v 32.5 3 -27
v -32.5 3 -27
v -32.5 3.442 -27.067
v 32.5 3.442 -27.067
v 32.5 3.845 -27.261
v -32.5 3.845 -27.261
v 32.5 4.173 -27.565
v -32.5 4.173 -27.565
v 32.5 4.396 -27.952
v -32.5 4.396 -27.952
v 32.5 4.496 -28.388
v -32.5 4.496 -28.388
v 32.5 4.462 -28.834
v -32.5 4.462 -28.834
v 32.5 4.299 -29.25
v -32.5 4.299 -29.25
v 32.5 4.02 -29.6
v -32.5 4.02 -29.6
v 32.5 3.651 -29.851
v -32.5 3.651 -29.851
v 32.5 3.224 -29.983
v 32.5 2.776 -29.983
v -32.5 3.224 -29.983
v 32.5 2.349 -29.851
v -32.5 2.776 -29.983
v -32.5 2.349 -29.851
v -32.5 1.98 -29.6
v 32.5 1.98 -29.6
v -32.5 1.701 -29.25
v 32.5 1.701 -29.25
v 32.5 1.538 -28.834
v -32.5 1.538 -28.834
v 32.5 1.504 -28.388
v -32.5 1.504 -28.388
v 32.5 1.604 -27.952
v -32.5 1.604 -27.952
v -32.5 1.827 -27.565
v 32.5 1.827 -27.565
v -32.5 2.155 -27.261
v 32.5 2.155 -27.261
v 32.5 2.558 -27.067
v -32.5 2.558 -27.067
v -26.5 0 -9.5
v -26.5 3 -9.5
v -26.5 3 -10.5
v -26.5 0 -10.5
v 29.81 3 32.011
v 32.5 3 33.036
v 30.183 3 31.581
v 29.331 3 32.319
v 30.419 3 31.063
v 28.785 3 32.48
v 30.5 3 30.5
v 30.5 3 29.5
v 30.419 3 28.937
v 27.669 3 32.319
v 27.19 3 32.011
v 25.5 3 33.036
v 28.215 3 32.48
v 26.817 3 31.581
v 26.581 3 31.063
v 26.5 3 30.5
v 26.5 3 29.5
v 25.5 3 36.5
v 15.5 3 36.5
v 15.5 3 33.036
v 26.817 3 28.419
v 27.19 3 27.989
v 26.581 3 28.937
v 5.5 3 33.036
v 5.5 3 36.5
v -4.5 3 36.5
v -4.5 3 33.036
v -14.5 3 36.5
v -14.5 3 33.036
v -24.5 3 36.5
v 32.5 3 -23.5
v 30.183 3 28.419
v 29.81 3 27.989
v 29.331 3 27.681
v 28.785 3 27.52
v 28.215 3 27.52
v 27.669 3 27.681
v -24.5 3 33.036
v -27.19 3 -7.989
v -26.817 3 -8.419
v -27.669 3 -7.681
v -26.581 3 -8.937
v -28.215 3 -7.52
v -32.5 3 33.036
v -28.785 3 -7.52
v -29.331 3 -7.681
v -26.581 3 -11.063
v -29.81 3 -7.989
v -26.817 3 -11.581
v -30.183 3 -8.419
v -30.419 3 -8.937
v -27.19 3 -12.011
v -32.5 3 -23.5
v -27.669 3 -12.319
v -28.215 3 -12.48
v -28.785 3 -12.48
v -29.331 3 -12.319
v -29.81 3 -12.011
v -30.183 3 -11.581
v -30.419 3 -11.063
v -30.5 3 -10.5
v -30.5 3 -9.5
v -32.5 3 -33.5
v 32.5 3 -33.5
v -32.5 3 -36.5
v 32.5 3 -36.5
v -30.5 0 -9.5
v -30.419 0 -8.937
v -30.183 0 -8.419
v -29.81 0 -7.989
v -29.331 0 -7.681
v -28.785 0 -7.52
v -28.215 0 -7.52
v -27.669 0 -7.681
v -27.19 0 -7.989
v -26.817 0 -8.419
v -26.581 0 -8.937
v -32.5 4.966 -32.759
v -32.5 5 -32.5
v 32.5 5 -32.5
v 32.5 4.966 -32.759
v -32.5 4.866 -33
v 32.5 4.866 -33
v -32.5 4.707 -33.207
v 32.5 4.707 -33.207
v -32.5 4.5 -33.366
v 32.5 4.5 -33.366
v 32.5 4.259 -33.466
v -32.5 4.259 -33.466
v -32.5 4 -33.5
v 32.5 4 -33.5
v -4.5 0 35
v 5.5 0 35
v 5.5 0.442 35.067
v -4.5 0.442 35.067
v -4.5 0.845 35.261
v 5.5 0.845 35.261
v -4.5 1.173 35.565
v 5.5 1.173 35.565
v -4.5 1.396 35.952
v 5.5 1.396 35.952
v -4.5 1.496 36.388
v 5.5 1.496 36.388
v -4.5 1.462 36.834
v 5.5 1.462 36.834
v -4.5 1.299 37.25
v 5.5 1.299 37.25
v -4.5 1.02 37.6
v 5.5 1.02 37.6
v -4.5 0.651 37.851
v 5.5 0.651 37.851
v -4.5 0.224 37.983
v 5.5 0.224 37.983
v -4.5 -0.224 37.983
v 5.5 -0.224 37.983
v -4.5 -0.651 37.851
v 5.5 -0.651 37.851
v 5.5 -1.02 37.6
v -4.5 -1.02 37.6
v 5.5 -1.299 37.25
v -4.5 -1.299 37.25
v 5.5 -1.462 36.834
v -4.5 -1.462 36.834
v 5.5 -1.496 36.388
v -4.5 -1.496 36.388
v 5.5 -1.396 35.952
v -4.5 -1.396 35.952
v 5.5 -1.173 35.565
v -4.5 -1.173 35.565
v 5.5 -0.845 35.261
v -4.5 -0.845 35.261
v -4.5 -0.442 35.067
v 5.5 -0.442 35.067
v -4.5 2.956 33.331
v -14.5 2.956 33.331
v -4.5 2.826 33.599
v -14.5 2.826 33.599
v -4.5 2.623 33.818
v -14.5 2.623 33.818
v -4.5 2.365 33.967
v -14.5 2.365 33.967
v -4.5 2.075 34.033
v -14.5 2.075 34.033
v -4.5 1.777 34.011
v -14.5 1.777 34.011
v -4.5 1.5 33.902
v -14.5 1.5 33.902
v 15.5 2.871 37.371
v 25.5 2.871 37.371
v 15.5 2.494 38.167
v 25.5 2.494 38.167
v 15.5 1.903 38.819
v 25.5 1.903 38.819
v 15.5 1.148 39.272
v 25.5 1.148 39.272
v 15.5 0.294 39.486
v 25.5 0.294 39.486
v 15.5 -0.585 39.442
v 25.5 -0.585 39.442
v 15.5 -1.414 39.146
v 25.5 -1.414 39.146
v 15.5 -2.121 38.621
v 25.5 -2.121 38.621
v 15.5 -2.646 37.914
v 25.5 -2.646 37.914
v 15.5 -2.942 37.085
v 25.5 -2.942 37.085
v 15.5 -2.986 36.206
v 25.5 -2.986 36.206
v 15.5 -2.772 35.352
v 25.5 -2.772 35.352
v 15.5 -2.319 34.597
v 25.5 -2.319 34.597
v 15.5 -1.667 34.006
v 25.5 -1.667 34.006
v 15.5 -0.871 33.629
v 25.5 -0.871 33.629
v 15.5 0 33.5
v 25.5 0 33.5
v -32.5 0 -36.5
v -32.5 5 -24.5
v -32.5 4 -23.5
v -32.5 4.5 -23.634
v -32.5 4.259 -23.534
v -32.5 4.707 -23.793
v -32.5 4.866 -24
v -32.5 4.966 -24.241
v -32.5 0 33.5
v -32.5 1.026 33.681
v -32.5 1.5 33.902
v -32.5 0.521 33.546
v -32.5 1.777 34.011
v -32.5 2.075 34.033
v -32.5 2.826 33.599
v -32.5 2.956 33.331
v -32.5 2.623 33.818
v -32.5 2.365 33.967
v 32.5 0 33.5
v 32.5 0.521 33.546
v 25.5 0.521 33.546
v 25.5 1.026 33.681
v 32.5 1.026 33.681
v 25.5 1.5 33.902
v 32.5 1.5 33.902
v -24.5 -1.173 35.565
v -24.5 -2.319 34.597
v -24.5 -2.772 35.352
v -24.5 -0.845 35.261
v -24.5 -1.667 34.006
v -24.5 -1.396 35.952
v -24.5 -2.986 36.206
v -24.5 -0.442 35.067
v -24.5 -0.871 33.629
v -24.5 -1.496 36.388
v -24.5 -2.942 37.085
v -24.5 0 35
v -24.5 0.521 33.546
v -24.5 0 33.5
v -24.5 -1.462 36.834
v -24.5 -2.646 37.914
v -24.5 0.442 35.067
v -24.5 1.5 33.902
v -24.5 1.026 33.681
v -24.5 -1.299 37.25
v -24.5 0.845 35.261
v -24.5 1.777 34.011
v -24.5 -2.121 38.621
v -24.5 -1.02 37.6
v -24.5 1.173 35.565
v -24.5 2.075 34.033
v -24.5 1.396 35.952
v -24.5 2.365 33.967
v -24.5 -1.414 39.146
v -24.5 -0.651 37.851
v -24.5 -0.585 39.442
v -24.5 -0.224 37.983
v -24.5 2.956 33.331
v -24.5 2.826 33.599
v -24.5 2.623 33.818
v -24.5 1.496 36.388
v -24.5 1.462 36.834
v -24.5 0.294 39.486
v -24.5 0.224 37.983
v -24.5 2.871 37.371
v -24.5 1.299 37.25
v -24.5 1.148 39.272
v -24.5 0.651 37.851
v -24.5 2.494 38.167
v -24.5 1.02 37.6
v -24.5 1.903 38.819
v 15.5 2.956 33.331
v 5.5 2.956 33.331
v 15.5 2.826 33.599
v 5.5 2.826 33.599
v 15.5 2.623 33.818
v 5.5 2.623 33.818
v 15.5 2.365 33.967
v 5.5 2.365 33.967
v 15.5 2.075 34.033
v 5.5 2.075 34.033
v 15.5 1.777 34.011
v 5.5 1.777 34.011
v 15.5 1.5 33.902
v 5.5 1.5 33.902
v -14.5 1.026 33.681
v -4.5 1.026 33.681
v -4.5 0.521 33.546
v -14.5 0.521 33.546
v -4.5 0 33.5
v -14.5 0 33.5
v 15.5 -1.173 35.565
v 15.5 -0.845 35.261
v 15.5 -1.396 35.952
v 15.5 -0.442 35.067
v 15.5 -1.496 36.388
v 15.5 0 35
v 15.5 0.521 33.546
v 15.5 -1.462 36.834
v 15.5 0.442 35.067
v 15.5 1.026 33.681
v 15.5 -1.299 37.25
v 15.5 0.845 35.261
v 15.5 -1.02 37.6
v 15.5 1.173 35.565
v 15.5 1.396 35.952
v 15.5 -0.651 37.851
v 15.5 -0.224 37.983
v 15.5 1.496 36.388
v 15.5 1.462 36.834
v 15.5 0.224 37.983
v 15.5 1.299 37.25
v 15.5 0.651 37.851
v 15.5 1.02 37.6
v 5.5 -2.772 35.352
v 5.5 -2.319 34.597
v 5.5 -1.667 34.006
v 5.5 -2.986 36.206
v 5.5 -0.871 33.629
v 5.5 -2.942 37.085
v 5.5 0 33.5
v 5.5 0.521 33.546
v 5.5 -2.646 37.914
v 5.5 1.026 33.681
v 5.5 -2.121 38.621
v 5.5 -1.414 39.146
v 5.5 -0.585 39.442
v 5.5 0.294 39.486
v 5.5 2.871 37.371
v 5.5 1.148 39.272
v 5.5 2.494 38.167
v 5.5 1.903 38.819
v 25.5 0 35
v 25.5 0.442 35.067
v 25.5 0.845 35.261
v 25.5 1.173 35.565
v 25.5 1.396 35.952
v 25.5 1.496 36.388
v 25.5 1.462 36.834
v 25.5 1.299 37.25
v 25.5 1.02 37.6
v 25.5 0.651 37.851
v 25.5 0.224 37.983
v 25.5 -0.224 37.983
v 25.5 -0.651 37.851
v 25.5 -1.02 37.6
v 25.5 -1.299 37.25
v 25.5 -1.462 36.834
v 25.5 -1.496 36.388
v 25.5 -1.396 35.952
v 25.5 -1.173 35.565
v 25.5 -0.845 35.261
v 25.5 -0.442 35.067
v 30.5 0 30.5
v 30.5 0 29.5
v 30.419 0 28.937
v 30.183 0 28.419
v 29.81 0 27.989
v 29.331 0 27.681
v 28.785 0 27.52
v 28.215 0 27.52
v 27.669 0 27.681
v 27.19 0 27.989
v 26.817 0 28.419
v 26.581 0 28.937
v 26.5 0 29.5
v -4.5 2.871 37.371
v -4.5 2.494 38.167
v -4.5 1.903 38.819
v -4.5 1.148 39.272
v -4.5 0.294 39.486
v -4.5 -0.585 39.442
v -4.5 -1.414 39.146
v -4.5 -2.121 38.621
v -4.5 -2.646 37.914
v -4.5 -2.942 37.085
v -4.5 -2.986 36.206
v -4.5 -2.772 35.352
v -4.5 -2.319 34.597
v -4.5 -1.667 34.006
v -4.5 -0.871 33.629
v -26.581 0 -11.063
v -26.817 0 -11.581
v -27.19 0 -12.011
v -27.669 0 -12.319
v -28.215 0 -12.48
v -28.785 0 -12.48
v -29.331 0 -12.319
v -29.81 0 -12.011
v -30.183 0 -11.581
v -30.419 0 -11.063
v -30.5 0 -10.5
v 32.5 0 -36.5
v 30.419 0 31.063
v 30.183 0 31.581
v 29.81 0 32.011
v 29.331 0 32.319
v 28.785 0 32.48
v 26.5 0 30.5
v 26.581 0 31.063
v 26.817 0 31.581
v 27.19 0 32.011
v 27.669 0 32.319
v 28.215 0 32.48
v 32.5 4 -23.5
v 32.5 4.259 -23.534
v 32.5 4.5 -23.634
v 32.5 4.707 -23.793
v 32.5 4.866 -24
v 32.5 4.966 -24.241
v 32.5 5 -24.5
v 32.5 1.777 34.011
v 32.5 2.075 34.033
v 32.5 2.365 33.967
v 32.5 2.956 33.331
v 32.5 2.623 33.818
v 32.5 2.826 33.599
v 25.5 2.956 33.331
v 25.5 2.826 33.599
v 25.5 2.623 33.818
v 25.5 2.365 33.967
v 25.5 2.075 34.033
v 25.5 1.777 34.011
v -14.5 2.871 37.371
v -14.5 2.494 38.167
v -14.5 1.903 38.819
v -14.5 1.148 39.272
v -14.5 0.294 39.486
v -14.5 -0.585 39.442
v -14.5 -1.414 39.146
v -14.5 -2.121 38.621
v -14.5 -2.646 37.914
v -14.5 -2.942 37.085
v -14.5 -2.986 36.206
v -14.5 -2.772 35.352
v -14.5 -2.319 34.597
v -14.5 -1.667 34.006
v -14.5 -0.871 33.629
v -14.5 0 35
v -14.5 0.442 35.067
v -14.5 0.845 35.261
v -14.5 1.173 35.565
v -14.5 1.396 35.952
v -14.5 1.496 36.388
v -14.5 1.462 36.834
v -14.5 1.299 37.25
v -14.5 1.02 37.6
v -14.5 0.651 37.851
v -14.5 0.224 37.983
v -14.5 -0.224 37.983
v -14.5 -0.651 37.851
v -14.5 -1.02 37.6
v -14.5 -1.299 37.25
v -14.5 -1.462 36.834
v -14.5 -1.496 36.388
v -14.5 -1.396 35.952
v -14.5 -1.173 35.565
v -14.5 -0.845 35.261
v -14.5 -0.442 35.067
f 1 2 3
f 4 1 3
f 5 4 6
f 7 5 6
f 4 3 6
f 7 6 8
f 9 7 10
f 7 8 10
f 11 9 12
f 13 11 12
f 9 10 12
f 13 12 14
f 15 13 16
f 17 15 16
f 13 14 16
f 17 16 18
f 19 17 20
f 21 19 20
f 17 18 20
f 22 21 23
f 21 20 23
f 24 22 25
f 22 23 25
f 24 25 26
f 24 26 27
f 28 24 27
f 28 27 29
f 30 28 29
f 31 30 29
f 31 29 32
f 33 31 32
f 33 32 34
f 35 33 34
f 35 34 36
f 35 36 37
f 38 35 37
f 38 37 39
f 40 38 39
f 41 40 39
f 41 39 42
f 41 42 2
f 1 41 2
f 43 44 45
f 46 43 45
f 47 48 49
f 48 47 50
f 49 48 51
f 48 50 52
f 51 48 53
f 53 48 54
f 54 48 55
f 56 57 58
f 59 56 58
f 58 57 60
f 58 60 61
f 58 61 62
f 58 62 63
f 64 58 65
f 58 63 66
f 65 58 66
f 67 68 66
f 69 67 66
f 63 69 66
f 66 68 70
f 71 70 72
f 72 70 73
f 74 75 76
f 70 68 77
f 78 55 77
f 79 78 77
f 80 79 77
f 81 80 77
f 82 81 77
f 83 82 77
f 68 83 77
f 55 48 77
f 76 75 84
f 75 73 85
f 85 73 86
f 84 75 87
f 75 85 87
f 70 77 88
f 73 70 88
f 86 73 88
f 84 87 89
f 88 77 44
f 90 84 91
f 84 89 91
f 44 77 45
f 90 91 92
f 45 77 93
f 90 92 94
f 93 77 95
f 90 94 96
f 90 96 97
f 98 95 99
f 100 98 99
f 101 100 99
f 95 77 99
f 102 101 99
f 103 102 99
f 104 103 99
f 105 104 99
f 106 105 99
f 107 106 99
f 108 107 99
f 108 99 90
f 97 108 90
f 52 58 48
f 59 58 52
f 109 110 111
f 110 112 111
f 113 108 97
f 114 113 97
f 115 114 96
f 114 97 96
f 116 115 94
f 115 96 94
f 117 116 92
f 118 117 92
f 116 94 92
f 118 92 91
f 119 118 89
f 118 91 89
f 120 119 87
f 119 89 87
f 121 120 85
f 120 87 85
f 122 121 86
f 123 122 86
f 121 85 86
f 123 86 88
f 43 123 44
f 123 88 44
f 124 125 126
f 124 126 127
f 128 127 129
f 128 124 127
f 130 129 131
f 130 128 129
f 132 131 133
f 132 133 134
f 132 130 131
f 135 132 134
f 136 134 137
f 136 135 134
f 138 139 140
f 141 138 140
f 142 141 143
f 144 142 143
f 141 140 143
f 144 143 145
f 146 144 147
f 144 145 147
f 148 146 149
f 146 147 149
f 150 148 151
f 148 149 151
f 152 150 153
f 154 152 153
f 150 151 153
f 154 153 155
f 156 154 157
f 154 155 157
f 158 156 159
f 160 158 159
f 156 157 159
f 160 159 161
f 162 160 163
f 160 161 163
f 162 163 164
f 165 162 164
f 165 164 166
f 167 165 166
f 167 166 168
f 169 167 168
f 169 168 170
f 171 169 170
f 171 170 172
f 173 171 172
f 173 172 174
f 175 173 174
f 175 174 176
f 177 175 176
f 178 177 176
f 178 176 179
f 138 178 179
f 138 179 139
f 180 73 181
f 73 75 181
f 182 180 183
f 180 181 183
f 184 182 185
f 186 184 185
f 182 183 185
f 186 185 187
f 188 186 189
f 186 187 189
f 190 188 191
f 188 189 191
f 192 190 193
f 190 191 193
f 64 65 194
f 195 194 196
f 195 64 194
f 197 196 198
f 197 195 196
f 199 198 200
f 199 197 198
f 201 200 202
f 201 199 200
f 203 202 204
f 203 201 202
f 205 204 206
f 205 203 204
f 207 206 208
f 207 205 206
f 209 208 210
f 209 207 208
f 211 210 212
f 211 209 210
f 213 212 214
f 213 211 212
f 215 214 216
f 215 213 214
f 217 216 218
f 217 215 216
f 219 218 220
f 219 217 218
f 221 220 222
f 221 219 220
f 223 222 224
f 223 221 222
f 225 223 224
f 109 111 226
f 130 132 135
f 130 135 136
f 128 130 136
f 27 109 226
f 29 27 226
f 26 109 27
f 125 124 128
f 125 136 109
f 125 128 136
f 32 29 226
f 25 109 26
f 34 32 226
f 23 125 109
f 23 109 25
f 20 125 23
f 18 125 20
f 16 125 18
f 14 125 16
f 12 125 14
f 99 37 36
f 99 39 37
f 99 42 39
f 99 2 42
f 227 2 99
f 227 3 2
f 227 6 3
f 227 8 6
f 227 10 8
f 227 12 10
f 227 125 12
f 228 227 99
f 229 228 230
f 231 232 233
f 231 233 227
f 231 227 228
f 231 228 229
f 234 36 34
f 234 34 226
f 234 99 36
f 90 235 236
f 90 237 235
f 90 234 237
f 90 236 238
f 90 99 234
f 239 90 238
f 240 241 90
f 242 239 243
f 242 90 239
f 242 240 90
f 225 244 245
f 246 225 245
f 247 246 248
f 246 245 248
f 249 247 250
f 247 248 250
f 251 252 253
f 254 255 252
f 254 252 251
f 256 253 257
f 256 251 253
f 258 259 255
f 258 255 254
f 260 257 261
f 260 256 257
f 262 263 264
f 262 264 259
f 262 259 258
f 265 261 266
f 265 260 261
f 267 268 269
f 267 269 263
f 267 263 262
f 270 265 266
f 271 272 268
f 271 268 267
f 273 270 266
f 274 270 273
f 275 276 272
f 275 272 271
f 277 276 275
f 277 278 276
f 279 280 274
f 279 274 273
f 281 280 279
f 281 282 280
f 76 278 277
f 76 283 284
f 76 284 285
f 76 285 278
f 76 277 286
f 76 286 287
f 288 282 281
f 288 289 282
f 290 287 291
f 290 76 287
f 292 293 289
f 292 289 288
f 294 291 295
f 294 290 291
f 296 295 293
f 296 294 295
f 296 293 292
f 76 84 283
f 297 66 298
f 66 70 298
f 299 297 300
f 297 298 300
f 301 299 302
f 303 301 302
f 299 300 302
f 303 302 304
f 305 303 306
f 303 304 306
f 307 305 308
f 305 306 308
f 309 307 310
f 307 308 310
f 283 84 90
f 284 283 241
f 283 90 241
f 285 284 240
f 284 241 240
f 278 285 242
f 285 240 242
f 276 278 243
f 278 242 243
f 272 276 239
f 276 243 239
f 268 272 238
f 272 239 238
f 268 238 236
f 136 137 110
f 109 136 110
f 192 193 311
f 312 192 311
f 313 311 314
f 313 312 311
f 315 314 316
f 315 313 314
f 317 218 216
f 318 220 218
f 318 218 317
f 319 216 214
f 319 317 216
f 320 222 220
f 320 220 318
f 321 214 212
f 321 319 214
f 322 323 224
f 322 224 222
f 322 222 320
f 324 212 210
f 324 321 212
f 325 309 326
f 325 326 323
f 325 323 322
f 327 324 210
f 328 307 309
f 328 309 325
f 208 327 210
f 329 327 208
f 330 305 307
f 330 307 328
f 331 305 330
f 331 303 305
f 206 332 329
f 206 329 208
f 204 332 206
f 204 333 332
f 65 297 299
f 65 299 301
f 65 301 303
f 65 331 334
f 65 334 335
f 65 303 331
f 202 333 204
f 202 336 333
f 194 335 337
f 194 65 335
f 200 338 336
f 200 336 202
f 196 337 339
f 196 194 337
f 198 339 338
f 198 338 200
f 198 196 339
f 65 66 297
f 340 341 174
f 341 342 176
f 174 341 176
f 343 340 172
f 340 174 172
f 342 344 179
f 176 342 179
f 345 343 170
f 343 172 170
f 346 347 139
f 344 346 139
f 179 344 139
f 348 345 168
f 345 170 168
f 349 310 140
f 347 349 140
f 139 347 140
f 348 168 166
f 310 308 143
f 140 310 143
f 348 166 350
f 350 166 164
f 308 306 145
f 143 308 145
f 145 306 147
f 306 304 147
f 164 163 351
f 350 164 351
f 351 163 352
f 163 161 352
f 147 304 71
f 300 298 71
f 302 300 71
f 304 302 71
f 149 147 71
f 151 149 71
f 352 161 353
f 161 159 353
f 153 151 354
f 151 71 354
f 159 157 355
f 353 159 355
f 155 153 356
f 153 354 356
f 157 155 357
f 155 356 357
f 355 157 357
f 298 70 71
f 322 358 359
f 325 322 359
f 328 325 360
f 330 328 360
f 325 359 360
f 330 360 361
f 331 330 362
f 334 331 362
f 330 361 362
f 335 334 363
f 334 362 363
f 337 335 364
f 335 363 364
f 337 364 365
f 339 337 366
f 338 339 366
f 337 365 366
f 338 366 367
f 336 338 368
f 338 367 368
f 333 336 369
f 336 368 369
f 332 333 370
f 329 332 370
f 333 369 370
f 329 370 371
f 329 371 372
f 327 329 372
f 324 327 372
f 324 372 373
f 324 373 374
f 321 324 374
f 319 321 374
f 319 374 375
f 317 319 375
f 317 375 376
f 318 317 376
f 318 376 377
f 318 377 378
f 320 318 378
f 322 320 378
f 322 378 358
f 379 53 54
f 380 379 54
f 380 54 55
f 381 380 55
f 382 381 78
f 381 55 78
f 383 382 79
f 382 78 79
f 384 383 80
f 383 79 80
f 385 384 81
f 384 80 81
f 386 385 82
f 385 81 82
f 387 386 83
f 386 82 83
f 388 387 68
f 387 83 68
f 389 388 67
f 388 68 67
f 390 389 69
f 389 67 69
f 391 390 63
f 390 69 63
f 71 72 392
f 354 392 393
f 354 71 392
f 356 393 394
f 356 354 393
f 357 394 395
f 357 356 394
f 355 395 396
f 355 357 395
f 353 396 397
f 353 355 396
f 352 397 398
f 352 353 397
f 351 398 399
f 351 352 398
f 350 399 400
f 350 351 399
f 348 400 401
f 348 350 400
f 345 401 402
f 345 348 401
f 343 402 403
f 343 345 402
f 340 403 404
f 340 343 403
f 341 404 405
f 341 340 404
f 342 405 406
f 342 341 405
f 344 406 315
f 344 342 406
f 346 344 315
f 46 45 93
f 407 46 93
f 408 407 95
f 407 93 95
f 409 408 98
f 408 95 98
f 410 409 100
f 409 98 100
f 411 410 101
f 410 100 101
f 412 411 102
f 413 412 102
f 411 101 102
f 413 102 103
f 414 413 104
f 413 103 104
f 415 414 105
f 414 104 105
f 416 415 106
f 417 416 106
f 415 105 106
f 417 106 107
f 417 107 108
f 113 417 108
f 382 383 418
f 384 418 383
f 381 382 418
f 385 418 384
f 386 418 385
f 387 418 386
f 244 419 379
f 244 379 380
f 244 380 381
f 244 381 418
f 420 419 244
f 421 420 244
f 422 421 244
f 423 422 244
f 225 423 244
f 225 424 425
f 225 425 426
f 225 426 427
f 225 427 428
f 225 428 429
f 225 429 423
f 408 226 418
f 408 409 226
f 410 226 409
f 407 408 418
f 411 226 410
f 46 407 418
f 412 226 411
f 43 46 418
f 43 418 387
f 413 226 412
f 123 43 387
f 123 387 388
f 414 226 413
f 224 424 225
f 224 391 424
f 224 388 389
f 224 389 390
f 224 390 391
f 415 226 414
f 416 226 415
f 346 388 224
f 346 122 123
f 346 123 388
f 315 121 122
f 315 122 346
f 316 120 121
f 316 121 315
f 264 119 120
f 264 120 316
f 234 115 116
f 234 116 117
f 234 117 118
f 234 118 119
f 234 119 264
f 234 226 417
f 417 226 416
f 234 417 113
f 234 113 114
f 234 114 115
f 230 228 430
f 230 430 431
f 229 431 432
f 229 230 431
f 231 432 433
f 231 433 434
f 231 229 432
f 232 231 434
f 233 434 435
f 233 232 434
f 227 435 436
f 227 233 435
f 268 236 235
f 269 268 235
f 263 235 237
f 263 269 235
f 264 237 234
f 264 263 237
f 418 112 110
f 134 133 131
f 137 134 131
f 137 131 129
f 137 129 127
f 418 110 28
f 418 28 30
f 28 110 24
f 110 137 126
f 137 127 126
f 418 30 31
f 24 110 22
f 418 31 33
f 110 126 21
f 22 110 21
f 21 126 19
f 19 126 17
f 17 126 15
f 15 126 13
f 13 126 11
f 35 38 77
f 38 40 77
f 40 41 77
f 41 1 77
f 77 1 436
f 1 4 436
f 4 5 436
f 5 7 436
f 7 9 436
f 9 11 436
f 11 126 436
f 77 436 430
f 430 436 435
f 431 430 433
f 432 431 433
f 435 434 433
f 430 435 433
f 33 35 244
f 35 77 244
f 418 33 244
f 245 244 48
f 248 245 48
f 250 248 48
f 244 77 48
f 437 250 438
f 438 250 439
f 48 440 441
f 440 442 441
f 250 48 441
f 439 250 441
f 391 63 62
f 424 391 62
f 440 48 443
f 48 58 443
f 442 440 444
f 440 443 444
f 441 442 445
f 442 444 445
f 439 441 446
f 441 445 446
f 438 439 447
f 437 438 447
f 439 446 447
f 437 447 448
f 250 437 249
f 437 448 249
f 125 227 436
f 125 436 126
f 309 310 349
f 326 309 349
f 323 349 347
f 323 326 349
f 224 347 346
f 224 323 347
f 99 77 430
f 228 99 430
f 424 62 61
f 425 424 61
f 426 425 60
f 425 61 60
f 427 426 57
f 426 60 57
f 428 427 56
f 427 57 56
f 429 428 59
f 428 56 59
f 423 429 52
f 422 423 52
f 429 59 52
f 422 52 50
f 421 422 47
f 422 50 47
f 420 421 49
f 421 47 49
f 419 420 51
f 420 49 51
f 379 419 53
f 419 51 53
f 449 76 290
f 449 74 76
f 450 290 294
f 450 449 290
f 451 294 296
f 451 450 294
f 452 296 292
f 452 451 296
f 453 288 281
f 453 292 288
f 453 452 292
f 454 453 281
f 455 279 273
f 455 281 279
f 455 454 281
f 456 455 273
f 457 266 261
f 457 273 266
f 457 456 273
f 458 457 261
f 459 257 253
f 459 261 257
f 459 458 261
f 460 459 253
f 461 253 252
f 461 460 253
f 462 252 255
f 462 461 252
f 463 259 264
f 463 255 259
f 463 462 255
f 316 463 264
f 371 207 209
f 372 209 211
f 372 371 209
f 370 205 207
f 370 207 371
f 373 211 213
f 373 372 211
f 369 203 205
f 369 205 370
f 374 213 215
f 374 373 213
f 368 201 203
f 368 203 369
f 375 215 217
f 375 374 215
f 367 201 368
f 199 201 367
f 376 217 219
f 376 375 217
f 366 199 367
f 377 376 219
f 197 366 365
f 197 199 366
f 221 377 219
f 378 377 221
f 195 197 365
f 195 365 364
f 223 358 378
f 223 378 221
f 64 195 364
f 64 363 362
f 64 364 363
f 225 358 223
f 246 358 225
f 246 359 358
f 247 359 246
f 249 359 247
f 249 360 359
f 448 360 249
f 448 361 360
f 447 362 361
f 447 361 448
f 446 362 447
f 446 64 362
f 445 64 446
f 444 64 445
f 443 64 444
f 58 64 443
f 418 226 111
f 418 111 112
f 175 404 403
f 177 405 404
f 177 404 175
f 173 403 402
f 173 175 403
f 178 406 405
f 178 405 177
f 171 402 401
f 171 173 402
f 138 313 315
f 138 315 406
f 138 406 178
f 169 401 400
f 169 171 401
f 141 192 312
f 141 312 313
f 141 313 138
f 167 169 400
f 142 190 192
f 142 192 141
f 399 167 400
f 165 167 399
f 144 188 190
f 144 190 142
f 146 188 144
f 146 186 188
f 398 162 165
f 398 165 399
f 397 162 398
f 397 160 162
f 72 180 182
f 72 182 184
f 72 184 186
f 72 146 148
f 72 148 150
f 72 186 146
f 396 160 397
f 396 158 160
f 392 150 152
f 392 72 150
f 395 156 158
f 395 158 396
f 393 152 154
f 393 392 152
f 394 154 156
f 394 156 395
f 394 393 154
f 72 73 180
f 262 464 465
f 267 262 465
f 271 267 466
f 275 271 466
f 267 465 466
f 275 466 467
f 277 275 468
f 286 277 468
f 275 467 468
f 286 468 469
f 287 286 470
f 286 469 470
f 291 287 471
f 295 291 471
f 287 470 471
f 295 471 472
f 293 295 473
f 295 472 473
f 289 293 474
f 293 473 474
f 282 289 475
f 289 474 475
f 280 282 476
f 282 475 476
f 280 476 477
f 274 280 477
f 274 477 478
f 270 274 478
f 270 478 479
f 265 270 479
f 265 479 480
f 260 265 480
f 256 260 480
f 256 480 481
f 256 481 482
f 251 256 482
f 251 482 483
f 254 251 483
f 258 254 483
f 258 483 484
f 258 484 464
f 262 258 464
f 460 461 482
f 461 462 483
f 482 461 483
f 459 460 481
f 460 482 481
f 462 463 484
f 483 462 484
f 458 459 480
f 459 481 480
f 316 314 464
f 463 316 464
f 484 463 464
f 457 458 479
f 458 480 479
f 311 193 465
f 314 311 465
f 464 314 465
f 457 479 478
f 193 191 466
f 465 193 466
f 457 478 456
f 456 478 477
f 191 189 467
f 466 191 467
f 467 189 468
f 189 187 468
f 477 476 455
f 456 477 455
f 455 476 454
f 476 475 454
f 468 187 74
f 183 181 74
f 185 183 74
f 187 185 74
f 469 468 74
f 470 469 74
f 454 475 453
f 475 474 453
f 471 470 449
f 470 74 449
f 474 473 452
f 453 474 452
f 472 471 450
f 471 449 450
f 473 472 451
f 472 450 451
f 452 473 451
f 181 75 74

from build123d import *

# Parameters (mm, degrees)
BOSS_EXTRUDE1_DEPTH = 3
SKETCH2_R           = 3.0000000000000013
BOSS_EXTRUDE2_DEPTH = 65
SKETCH14_R          = 2.999999999999994
CUT_EXTRUDE1_DEPTH  = 8
SKETCH15_R          = 2.999999999999994
CUT_EXTRUDE2_DEPTH  = 10
SKETCH16_R          = 2.999999999999994
CUT_EXTRUDE3_DEPTH  = 10
SKETCH17_R          = 3.0000000000000013
CUT_EXTRUDE4_DEPTH  = 7
CUT_EXTRUDE5_DEPTH  = 7
SKETCH19_R          = 3.0000000000000013
BOSS_EXTRUDE3_DEPTH = 65
SKETCH13_R          = 1.500000000000004
CUT_EXTRUDE7_DEPTH  = 77.29711659034044
SKETCH20_R          = 1.5000000000000042
CUT_EXTRUDE8_DEPTH  = 77.29711659034045
FILLET1_R           = 1
SKETCH21_R          = 1.5000000000000075
BOSS_EXTRUDE4_DEPTH = 65
SKETCH22_W          = 5.918541019528025
SKETCH22_H          = 2.806652575268912
CUT_EXTRUDE9_DEPTH  = 77.29711659034044


with BuildPart() as part:
    # Sketch1 → Boss-Extrude1 (new body)
    with BuildSketch(Plane(origin=(0, 0, 0), x_dir=(1, 0, 0), z_dir=(0, 1, 0))):
        Polygon((-32.50000000000001, 36.49999999999999), (32.49999999999999, 36.49999999999999), (32.500000000000014, -36.50000000000001), (-32.5, -36.50000000000001), align=None)
    extrude(amount=BOSS_EXTRUDE1_DEPTH)

    # Sketch2 → Boss-Extrude2 (add, through all)
    with BuildSketch(Plane(origin=(32.5, 0, -9.27e-15), x_dir=(0, 0, -1), z_dir=(1, 0, 0))):
        with Locations((-36.500000000000014, 0)):
            Circle(SKETCH2_R)
    extrude(amount=-BOSS_EXTRUDE2_DEPTH)

    # Sketch14 → Cut-Extrude1 (cut)
    with BuildSketch(Plane.ZY.offset(24.500000000000004)):
        with Locations((36.500000000000014, 0)):
            Circle(SKETCH14_R)
    extrude(amount=CUT_EXTRUDE1_DEPTH, mode=Mode.SUBTRACT)

    # Sketch15 → Cut-Extrude2 (cut)
    with BuildSketch(Plane.ZY.offset(4.5000000000000036)):
        with Locations((36.500000000000014, 0)):
            Circle(SKETCH15_R)
    extrude(amount=CUT_EXTRUDE2_DEPTH, mode=Mode.SUBTRACT)

    # Sketch16 → Cut-Extrude3 (cut)
    with BuildSketch(Plane.ZY.offset(-15.499999999999996)):
        with Locations((36.500000000000014, 0)):
            Circle(SKETCH16_R)
    extrude(amount=CUT_EXTRUDE3_DEPTH, mode=Mode.SUBTRACT)

    # Sketch17 → Cut-Extrude4 (cut)
    with BuildSketch(Plane(origin=(32.5, 0, -9.27e-15), x_dir=(-1.9e-16, 0, -1), z_dir=(1, 0, -1.9e-16))):
        with Locations((-36.500000000000014, 0)):
            Circle(SKETCH17_R)
    extrude(amount=-CUT_EXTRUDE4_DEPTH, mode=Mode.SUBTRACT)

    # Sketch18 → Cut-Extrude5 (cut)
    with BuildSketch(Plane(origin=(0, 3, 0), x_dir=(1, 0, 0), z_dir=(0, 1, 0))):
        with BuildLine():
            Line((-30.50000000000002, 10.499999999999995), (-30.50000000000002, 9.500000000000002))
            ThreePointArc((-30.50000000000002, 9.500000000000002), (-28.500000000000018, 7.499999999999998), (-26.500000000000018, 9.500000000000002))
            Line((-26.500000000000018, 9.500000000000002), (-26.500000000000018, 10.499999999999995))
            ThreePointArc((-26.500000000000018, 10.499999999999995), (-28.500000000000018, 12.499999999999995), (-30.50000000000002, 10.499999999999995))
        make_face()
        with BuildLine():
            Line((26.5, -29.500000000000007), (26.5, -30.5))
            ThreePointArc((26.5, -30.5), (28.499999999999993, -32.49999999999999), (30.49999999999999, -30.5))
            Line((30.49999999999999, -30.5), (30.49999999999999, -29.500000000000007))
            ThreePointArc((30.49999999999999, -29.500000000000007), (28.499999999999993, -27.50000000000001), (26.5, -29.500000000000007))
        make_face()
    extrude(amount=-CUT_EXTRUDE5_DEPTH, mode=Mode.SUBTRACT)

    # Sketch19 → Boss-Extrude3 (add)
    with BuildSketch(Plane.ZY.offset(32.50000000000001)):
        with Locations((-28.500000000000004, 2.999999999999999)):
            Circle(SKETCH19_R)
    extrude(amount=-BOSS_EXTRUDE3_DEPTH)

    # Sketch13 → Cut-Extrude7 (cut, through all)
    with BuildSketch(Plane(origin=(32.5, 0, -9.27e-15), x_dir=(0, 0, -1), z_dir=(1, 0, 0))):
        with Locations((-36.500000000000014, 0)):
            Circle(SKETCH13_R)
    extrude(amount=-CUT_EXTRUDE7_DEPTH, mode=Mode.SUBTRACT)

    # Sketch20 → Cut-Extrude8 (cut, through all)
    with BuildSketch(Plane.ZY.offset(32.50000000000001)):
        with Locations((-28.5, 2.999999999999999)):
            Circle(SKETCH20_R)
    extrude(amount=-CUT_EXTRUDE8_DEPTH, mode=Mode.SUBTRACT)

    # Fillet1
    fillet1_edges = [part.edges().sort_by_distance(p)[0] for p in [
        (-28.5, 3, 36.50000000000001),
        (-9.5, 3, 36.50000000000001),
        (10.500000000000004, 3, 36.50000000000001),
        (29.00000000000001, 3, 36.50000000000001),
    ]]
    fillet(fillet1_edges, radius=FILLET1_R)

    # Sketch21 → Boss-Extrude4 (add, through all)
    with BuildSketch(Plane.ZY.offset(32.50000000000001)):
        with BuildLine():
            Line((-33.50000000000001, 0), (-23.500000000000007, 0))
            Line((-23.500000000000007, 0), (-23.500000000000007, 3.9999999999999933))
            ThreePointArc((-23.500000000000007, 3.9999999999999933), (-23.79289321881346, 4.707106781186548), (-24.500000000000014, 5))
            Line((-24.500000000000014, 5), (-32.5, 5))
            ThreePointArc((-32.5, 5), (-33.20710678118655, 4.707106781186548), (-33.50000000000001, 3.9999999999999933))
            Line((-33.50000000000001, 3.9999999999999933), (-33.50000000000001, 0))
        make_face()
        with Locations((-28.500000000000004, 2.999999999999999)):
            Circle(SKETCH21_R, mode=Mode.SUBTRACT)
    extrude(amount=-BOSS_EXTRUDE4_DEPTH)

    # Sketch22 → Cut-Extrude9 (cut, through all)
    with BuildSketch(Plane(origin=(32.5, 0, -9.27e-15), x_dir=(-2.9e-16, 0, -1), z_dir=(1, 0, -2.9e-16))):
        with Locations((28.341236521014125, 6.4033262876344565)):
            Rectangle(SKETCH22_W, SKETCH22_H)
    extrude(amount=-CUT_EXTRUDE9_DEPTH, mode=Mode.SUBTRACT)


solid = part.part
